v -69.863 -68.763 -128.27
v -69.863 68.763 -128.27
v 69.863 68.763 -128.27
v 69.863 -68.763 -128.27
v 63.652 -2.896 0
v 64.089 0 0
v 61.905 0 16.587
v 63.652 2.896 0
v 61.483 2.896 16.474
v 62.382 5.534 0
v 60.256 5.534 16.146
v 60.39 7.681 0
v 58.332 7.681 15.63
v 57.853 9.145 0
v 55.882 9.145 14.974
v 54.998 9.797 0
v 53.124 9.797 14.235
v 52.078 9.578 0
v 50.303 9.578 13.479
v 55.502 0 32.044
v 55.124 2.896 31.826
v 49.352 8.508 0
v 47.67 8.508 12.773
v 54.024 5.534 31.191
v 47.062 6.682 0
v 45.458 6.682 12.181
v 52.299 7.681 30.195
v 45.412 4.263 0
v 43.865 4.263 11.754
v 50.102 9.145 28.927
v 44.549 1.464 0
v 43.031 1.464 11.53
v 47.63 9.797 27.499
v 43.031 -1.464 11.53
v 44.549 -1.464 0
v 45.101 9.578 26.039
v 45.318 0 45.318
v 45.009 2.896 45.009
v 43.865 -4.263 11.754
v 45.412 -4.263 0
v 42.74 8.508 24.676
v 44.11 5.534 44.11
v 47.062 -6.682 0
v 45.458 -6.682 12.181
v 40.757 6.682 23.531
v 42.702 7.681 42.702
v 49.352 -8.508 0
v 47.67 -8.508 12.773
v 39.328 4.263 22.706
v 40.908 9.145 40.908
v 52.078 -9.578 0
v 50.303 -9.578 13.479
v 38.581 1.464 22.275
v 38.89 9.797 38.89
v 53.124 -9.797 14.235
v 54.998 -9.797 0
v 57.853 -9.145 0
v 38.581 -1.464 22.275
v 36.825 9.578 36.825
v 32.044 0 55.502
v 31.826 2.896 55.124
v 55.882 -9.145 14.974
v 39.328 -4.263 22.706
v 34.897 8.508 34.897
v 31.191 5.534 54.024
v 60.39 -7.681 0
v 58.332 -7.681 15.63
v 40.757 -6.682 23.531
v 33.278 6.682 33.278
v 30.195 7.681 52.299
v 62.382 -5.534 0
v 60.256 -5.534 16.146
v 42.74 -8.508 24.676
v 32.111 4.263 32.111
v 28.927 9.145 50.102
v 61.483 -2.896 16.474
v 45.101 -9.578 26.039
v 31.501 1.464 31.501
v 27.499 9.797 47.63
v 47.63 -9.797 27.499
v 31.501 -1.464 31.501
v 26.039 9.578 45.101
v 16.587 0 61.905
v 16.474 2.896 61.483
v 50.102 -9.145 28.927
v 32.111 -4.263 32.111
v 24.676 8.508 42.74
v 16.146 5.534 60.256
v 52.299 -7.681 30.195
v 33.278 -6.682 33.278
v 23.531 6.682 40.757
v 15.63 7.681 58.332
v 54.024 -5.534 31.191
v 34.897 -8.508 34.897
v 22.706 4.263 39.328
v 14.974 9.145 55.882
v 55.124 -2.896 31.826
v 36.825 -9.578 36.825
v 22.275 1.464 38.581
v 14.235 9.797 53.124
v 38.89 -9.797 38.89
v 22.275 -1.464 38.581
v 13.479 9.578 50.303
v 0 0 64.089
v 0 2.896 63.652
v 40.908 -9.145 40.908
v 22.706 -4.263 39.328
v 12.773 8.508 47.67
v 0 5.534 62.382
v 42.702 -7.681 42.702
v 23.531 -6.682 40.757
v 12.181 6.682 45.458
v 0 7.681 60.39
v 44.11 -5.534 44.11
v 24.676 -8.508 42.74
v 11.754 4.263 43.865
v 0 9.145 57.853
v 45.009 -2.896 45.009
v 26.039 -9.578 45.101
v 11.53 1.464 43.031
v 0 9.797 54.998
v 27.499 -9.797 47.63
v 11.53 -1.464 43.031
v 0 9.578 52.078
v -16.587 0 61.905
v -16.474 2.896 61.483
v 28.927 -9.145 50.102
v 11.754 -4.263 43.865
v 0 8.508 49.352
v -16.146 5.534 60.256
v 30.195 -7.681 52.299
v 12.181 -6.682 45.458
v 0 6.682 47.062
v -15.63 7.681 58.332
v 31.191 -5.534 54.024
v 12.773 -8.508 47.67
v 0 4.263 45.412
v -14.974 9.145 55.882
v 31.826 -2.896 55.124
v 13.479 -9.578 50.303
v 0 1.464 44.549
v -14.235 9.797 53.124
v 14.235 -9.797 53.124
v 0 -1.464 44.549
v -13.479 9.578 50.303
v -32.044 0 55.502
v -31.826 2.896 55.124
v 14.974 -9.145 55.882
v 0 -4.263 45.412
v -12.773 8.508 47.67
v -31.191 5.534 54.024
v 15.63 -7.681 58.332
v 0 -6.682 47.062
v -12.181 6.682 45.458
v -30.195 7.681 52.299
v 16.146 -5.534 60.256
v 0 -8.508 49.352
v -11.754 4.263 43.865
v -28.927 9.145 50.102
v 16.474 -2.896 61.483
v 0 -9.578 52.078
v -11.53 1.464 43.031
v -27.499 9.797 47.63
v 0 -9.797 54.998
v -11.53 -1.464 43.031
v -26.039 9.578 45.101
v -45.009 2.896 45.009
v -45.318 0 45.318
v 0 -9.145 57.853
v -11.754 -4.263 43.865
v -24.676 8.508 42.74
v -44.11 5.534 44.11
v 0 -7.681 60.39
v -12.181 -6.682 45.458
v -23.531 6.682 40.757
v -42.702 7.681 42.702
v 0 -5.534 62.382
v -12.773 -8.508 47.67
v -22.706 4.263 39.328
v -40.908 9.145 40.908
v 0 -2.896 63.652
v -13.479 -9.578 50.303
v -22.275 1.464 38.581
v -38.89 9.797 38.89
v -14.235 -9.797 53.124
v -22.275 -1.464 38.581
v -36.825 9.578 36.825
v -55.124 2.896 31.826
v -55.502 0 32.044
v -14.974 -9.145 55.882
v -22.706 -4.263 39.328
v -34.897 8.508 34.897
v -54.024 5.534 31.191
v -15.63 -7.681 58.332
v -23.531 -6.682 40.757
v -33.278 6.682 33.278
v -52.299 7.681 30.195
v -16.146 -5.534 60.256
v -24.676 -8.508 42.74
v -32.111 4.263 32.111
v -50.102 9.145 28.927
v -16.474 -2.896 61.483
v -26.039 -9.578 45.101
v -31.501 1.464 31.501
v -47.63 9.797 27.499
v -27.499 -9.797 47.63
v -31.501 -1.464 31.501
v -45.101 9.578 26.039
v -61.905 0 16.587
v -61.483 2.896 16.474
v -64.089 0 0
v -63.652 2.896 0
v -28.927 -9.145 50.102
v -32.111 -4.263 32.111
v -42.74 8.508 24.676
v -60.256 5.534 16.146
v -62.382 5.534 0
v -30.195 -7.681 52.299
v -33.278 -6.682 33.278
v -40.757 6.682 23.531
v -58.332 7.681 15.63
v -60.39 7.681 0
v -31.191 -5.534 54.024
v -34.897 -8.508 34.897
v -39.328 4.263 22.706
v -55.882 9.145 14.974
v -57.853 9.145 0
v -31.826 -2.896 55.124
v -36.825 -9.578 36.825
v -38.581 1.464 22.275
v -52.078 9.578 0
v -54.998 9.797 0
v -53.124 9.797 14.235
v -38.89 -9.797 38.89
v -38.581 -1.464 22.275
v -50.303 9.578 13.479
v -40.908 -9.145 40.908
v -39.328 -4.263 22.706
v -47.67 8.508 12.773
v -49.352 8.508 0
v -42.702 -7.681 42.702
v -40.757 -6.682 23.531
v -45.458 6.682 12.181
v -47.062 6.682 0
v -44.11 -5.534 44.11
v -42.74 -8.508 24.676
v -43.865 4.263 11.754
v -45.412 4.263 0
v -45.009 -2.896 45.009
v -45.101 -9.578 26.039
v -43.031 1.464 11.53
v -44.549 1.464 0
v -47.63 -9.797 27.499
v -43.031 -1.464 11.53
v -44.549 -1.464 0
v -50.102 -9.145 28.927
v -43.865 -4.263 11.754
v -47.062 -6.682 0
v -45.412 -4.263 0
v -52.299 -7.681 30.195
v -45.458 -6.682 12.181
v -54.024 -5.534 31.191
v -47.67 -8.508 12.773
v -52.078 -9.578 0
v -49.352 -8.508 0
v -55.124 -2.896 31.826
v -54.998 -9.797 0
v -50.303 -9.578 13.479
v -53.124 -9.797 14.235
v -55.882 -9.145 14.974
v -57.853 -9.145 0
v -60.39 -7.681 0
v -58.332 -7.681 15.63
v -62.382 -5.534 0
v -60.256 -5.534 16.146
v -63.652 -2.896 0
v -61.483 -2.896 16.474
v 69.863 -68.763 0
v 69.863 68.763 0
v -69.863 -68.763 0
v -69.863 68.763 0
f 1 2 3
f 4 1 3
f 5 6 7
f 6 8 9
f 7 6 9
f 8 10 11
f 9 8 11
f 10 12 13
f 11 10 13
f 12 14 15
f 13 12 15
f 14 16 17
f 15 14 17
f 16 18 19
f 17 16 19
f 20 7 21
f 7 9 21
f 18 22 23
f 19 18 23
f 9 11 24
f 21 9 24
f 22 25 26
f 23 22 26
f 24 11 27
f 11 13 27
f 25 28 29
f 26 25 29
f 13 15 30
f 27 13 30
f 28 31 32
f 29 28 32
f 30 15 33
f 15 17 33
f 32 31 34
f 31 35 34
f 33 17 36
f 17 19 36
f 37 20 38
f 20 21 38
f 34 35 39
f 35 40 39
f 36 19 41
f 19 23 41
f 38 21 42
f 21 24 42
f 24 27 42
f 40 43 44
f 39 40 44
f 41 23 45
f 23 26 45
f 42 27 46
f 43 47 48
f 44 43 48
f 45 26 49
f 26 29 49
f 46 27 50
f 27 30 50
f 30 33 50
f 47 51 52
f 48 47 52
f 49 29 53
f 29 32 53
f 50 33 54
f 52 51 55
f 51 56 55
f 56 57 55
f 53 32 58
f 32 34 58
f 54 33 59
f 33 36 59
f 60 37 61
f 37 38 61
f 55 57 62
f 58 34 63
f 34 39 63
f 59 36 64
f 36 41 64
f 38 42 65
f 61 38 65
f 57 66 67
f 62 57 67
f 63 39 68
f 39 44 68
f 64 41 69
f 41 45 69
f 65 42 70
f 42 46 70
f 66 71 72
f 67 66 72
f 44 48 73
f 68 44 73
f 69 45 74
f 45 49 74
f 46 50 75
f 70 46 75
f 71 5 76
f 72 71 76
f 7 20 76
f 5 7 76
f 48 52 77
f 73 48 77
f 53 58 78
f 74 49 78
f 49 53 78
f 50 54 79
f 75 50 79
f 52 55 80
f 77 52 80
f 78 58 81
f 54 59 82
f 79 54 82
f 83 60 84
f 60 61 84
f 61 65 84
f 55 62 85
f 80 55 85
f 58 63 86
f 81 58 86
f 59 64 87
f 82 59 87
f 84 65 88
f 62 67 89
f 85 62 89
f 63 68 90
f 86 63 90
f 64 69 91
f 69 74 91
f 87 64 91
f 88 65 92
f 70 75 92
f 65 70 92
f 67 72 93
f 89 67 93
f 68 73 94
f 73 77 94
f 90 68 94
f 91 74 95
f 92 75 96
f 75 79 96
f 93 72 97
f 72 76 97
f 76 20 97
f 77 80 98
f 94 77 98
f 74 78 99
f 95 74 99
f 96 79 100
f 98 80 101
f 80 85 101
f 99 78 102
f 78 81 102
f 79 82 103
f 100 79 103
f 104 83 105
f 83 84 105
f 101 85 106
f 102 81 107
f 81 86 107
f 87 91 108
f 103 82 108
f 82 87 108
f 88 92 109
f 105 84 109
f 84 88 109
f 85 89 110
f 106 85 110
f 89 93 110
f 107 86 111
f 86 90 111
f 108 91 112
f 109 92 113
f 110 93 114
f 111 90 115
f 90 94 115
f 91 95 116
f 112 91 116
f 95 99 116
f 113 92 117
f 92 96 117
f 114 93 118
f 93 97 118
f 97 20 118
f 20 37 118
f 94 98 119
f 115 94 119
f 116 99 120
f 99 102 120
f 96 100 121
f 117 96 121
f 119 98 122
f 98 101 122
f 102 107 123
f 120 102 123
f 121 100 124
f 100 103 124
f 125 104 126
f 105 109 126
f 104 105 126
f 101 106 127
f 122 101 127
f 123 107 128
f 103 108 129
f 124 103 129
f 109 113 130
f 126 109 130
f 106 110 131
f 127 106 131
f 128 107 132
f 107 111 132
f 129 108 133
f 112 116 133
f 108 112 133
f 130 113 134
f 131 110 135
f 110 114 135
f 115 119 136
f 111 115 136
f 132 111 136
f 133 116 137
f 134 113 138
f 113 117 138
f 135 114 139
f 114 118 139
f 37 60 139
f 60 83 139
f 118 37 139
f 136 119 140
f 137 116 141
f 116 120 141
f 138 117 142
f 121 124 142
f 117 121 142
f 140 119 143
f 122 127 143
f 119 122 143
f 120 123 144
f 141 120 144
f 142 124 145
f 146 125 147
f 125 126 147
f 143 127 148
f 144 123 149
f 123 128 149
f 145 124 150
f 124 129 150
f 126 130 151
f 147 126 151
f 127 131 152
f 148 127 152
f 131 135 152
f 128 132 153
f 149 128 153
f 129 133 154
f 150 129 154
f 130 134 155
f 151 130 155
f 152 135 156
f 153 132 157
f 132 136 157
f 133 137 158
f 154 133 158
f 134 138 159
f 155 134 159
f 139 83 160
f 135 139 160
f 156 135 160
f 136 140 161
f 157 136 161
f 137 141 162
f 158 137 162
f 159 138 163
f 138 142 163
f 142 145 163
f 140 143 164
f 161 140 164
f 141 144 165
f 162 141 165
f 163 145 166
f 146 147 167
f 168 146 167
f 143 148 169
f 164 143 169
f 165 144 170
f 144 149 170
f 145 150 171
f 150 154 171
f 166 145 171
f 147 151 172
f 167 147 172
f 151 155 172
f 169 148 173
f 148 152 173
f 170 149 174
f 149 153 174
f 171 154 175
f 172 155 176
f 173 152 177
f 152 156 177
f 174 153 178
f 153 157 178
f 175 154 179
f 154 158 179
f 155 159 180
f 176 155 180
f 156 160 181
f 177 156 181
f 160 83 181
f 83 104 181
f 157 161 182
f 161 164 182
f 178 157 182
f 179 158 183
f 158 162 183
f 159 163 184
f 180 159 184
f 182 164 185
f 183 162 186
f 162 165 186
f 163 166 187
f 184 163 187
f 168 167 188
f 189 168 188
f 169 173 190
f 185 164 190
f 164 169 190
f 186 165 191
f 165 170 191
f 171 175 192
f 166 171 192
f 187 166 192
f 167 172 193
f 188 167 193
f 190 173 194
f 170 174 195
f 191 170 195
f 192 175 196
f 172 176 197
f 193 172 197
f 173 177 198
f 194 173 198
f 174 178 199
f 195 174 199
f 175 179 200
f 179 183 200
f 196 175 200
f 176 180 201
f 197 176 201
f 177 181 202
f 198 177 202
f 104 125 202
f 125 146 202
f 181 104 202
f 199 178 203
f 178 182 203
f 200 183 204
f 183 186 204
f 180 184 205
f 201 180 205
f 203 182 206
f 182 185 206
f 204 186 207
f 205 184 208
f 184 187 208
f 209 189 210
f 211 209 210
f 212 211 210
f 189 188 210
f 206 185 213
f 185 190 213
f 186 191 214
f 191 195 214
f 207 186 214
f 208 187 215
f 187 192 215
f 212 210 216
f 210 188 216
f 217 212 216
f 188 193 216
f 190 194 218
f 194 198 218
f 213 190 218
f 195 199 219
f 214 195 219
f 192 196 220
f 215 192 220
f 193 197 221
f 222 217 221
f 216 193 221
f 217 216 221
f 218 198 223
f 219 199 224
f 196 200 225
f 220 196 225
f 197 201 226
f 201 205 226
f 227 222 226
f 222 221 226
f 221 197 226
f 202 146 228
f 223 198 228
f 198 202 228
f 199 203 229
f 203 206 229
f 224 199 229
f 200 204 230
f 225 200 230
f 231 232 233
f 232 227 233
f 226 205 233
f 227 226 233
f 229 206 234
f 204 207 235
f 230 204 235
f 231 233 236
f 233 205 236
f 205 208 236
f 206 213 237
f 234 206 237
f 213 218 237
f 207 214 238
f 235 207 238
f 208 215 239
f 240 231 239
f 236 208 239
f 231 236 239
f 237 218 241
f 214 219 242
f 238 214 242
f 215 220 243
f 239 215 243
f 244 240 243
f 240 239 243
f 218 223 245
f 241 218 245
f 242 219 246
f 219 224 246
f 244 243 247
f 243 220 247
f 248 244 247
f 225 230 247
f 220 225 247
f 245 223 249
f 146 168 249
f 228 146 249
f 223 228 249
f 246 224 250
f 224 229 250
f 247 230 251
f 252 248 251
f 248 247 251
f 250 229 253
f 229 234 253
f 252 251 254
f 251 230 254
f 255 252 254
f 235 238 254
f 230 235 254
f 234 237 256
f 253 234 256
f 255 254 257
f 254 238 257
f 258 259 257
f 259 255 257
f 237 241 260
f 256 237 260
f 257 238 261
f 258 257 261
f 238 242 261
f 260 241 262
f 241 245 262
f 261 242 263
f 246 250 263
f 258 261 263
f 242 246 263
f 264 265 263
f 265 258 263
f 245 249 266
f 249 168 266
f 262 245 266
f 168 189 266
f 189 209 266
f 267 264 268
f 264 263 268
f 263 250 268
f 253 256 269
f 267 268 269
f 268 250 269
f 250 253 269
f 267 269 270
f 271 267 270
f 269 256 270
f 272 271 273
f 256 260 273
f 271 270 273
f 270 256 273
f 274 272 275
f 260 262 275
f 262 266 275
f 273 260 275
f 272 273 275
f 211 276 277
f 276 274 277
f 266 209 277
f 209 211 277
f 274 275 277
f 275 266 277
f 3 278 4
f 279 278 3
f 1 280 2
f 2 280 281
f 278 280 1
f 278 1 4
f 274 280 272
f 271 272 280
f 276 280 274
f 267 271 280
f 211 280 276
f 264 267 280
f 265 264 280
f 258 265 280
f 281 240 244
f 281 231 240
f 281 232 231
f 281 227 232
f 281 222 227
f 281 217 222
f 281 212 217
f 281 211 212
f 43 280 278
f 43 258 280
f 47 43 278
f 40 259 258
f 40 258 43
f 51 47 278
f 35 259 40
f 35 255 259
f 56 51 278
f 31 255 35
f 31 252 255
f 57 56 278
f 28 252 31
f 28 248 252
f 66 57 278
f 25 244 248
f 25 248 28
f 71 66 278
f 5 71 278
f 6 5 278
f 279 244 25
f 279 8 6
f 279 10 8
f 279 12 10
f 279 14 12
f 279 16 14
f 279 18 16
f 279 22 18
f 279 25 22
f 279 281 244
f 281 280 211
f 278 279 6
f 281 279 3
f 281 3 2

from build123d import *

# Parameters (mm, degrees)
F1_R     = 9.824635
F0_W     = 69.863096
F0_H     = 137.526572
F3_DEPTH = 128.27


with BuildPart() as f2:
    # F1 (on Top) → F2 (revolve)
    with BuildSketch(Plane.XY):
        with Locations((54.264009, 0)):
            Circle(F1_R)
    revolve(axis=Axis((0, 0, 0), (0, -1, 0)))

    # F0 (on Top) → F3 (join)
    with BuildSketch(Plane.XY):
        with Locations((-34.931548, 0)):
            Rectangle(F0_W, F0_H)
        with Locations((34.931548, 0)):
            Rectangle(F0_W, F0_H)
    extrude(amount=-F3_DEPTH)


solid = f2.part
